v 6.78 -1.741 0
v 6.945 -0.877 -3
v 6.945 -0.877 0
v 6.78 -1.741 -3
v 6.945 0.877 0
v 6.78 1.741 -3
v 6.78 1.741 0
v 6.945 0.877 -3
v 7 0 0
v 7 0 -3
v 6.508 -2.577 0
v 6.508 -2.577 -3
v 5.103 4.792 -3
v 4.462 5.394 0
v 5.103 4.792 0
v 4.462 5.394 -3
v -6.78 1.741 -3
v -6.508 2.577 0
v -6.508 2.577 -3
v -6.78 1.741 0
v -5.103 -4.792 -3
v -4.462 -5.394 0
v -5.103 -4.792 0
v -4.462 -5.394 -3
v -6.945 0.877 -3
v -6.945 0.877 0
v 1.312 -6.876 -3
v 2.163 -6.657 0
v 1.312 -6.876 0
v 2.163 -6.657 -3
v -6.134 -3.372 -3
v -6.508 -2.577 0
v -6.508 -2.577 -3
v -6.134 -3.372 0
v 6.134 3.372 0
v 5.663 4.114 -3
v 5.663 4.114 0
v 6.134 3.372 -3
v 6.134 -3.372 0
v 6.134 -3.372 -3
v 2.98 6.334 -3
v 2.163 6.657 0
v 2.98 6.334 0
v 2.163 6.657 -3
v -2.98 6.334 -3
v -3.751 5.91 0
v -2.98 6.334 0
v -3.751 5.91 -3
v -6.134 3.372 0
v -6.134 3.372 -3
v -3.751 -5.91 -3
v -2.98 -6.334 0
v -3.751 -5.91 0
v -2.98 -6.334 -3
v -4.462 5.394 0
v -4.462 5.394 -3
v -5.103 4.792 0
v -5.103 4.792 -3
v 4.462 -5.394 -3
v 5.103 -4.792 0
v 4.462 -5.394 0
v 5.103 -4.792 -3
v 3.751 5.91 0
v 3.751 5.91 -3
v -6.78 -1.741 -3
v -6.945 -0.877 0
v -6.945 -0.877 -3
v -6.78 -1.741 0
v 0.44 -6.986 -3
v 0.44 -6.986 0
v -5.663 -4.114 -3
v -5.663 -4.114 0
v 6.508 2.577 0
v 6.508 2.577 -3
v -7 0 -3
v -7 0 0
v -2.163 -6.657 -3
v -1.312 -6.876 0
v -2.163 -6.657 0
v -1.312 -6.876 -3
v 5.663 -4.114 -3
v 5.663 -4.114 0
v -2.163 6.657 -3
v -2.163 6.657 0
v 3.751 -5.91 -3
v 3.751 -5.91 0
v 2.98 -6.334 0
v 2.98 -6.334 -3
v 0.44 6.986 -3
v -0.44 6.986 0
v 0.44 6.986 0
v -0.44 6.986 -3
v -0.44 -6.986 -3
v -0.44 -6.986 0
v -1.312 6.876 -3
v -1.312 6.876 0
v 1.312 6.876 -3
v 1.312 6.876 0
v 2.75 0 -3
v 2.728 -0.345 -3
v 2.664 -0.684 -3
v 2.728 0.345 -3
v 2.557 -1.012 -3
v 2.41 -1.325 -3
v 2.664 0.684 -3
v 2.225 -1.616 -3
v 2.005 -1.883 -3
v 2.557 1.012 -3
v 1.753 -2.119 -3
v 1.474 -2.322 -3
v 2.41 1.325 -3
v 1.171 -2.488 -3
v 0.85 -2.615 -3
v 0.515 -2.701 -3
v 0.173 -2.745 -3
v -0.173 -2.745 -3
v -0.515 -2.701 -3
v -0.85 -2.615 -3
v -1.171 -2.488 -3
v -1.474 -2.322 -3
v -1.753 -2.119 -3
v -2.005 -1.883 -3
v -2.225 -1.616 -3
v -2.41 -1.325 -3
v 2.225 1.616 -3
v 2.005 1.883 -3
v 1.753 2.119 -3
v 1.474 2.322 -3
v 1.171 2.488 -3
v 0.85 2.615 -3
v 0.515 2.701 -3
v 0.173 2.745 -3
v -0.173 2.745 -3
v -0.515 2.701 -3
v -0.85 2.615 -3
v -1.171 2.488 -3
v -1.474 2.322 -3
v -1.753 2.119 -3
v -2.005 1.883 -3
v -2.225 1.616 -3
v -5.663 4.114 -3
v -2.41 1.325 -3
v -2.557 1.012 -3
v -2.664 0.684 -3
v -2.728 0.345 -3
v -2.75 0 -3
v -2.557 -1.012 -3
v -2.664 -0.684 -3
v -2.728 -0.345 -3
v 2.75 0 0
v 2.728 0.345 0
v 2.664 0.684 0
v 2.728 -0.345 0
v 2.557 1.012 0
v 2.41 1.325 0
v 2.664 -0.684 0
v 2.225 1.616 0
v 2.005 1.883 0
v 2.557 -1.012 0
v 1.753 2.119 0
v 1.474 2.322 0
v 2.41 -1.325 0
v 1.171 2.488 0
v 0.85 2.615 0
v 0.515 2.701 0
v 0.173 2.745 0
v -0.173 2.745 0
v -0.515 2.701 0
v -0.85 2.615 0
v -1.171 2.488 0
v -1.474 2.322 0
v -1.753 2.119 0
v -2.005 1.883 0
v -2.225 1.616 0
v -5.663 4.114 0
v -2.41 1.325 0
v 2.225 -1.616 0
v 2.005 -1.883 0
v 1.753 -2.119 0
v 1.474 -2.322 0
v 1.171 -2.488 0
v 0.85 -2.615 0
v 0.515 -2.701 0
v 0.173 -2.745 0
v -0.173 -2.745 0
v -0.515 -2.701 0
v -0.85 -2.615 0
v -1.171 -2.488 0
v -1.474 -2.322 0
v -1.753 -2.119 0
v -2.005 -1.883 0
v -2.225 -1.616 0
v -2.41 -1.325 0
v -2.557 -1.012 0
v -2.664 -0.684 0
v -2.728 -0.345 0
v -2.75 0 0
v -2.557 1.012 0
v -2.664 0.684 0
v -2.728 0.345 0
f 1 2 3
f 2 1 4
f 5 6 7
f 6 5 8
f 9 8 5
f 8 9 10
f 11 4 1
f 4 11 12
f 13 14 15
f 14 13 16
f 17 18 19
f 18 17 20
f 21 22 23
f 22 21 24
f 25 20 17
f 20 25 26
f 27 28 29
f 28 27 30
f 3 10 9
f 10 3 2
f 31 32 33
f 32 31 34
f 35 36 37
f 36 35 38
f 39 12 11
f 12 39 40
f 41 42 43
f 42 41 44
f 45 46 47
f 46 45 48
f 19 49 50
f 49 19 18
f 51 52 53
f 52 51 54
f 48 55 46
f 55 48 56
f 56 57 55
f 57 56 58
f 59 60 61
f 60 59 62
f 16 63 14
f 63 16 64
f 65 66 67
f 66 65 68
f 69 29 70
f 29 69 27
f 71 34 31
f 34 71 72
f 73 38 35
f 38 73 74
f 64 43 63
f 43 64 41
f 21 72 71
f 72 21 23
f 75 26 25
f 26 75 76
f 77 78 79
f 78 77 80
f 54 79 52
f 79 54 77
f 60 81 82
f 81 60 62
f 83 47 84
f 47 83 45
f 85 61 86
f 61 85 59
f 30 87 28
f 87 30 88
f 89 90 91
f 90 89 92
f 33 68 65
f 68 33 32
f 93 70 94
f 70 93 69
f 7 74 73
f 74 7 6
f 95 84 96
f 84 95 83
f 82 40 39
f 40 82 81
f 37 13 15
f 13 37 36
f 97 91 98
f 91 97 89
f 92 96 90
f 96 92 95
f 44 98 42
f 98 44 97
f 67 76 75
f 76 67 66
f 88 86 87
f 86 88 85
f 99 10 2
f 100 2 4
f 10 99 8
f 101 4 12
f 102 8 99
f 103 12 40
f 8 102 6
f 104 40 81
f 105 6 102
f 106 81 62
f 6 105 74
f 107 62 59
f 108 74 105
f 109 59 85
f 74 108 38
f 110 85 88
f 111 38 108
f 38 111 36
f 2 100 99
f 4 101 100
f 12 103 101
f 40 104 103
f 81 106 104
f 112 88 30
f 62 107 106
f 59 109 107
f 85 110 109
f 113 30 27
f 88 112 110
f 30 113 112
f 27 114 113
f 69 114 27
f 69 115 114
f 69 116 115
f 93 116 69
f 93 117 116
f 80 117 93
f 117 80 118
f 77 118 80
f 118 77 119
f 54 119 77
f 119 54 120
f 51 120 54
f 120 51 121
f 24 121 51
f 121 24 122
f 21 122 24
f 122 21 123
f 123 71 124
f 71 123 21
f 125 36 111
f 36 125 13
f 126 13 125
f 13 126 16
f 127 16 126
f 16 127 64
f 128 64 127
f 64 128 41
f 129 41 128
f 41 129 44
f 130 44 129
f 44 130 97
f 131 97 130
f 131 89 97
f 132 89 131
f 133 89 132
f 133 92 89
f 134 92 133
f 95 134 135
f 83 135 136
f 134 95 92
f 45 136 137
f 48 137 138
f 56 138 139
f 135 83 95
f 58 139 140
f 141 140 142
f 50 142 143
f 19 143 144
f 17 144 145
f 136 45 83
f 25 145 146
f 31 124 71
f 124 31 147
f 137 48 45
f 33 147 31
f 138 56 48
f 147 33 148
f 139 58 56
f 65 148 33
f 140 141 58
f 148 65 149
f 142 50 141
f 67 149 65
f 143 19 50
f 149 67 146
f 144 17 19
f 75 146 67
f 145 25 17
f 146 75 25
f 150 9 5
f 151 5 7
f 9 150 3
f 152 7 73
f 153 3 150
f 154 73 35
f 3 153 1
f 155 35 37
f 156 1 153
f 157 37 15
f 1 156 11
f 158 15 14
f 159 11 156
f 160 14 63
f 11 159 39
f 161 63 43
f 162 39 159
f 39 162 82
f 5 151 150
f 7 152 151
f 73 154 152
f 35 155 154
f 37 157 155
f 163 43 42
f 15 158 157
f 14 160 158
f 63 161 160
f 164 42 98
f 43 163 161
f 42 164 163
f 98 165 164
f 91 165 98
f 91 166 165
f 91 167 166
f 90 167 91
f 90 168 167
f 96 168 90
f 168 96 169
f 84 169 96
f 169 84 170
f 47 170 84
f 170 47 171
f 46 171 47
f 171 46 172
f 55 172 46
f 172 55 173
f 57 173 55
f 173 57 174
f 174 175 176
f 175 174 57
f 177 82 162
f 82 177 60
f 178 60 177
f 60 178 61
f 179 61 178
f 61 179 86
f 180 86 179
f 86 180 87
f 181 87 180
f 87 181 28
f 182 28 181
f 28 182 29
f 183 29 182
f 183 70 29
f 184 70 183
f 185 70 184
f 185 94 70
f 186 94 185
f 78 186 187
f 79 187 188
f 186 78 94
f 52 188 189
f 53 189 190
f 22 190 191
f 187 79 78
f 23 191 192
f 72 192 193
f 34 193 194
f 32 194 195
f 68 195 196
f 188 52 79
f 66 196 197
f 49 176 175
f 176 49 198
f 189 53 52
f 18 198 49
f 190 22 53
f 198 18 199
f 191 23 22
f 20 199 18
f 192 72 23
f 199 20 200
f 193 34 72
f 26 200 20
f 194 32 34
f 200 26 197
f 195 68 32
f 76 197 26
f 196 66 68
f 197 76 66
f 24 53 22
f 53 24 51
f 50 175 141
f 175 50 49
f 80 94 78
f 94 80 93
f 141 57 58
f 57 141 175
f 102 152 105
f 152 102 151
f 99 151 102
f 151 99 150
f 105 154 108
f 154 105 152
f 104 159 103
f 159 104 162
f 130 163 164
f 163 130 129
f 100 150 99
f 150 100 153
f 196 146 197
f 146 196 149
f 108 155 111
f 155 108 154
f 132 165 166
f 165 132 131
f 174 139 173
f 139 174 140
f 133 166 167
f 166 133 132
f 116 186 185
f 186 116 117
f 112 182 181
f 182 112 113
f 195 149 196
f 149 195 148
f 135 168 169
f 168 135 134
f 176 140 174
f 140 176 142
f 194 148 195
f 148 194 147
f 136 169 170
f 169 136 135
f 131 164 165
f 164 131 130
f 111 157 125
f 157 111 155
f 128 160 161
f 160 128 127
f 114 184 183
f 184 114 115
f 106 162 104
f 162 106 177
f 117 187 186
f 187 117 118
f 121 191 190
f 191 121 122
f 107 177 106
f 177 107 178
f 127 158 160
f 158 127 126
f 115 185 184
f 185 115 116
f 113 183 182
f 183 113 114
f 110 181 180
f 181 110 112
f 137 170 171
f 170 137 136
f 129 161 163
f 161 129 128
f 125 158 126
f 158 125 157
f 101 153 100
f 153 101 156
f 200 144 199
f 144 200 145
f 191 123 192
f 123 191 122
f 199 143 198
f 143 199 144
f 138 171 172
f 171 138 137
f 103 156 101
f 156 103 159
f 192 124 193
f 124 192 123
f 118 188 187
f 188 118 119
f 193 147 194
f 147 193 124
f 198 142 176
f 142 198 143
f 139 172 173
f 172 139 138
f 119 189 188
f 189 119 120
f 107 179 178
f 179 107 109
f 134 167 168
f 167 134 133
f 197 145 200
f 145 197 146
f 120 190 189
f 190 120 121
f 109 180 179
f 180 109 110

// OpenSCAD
$fn = 50;


difference() {
	union() {
		translate(v = [0, 0, -3.0000000000]) {
			cylinder(h = 3, r = 7.0000000000);
		}
		cylinder(h = 0, r = 17.0000000000);
	}
	union() {
		#translate(v = [0, 0, -3]) {
			cylinder(h = 3, r = 2.7500000000);
		}
	}
}
